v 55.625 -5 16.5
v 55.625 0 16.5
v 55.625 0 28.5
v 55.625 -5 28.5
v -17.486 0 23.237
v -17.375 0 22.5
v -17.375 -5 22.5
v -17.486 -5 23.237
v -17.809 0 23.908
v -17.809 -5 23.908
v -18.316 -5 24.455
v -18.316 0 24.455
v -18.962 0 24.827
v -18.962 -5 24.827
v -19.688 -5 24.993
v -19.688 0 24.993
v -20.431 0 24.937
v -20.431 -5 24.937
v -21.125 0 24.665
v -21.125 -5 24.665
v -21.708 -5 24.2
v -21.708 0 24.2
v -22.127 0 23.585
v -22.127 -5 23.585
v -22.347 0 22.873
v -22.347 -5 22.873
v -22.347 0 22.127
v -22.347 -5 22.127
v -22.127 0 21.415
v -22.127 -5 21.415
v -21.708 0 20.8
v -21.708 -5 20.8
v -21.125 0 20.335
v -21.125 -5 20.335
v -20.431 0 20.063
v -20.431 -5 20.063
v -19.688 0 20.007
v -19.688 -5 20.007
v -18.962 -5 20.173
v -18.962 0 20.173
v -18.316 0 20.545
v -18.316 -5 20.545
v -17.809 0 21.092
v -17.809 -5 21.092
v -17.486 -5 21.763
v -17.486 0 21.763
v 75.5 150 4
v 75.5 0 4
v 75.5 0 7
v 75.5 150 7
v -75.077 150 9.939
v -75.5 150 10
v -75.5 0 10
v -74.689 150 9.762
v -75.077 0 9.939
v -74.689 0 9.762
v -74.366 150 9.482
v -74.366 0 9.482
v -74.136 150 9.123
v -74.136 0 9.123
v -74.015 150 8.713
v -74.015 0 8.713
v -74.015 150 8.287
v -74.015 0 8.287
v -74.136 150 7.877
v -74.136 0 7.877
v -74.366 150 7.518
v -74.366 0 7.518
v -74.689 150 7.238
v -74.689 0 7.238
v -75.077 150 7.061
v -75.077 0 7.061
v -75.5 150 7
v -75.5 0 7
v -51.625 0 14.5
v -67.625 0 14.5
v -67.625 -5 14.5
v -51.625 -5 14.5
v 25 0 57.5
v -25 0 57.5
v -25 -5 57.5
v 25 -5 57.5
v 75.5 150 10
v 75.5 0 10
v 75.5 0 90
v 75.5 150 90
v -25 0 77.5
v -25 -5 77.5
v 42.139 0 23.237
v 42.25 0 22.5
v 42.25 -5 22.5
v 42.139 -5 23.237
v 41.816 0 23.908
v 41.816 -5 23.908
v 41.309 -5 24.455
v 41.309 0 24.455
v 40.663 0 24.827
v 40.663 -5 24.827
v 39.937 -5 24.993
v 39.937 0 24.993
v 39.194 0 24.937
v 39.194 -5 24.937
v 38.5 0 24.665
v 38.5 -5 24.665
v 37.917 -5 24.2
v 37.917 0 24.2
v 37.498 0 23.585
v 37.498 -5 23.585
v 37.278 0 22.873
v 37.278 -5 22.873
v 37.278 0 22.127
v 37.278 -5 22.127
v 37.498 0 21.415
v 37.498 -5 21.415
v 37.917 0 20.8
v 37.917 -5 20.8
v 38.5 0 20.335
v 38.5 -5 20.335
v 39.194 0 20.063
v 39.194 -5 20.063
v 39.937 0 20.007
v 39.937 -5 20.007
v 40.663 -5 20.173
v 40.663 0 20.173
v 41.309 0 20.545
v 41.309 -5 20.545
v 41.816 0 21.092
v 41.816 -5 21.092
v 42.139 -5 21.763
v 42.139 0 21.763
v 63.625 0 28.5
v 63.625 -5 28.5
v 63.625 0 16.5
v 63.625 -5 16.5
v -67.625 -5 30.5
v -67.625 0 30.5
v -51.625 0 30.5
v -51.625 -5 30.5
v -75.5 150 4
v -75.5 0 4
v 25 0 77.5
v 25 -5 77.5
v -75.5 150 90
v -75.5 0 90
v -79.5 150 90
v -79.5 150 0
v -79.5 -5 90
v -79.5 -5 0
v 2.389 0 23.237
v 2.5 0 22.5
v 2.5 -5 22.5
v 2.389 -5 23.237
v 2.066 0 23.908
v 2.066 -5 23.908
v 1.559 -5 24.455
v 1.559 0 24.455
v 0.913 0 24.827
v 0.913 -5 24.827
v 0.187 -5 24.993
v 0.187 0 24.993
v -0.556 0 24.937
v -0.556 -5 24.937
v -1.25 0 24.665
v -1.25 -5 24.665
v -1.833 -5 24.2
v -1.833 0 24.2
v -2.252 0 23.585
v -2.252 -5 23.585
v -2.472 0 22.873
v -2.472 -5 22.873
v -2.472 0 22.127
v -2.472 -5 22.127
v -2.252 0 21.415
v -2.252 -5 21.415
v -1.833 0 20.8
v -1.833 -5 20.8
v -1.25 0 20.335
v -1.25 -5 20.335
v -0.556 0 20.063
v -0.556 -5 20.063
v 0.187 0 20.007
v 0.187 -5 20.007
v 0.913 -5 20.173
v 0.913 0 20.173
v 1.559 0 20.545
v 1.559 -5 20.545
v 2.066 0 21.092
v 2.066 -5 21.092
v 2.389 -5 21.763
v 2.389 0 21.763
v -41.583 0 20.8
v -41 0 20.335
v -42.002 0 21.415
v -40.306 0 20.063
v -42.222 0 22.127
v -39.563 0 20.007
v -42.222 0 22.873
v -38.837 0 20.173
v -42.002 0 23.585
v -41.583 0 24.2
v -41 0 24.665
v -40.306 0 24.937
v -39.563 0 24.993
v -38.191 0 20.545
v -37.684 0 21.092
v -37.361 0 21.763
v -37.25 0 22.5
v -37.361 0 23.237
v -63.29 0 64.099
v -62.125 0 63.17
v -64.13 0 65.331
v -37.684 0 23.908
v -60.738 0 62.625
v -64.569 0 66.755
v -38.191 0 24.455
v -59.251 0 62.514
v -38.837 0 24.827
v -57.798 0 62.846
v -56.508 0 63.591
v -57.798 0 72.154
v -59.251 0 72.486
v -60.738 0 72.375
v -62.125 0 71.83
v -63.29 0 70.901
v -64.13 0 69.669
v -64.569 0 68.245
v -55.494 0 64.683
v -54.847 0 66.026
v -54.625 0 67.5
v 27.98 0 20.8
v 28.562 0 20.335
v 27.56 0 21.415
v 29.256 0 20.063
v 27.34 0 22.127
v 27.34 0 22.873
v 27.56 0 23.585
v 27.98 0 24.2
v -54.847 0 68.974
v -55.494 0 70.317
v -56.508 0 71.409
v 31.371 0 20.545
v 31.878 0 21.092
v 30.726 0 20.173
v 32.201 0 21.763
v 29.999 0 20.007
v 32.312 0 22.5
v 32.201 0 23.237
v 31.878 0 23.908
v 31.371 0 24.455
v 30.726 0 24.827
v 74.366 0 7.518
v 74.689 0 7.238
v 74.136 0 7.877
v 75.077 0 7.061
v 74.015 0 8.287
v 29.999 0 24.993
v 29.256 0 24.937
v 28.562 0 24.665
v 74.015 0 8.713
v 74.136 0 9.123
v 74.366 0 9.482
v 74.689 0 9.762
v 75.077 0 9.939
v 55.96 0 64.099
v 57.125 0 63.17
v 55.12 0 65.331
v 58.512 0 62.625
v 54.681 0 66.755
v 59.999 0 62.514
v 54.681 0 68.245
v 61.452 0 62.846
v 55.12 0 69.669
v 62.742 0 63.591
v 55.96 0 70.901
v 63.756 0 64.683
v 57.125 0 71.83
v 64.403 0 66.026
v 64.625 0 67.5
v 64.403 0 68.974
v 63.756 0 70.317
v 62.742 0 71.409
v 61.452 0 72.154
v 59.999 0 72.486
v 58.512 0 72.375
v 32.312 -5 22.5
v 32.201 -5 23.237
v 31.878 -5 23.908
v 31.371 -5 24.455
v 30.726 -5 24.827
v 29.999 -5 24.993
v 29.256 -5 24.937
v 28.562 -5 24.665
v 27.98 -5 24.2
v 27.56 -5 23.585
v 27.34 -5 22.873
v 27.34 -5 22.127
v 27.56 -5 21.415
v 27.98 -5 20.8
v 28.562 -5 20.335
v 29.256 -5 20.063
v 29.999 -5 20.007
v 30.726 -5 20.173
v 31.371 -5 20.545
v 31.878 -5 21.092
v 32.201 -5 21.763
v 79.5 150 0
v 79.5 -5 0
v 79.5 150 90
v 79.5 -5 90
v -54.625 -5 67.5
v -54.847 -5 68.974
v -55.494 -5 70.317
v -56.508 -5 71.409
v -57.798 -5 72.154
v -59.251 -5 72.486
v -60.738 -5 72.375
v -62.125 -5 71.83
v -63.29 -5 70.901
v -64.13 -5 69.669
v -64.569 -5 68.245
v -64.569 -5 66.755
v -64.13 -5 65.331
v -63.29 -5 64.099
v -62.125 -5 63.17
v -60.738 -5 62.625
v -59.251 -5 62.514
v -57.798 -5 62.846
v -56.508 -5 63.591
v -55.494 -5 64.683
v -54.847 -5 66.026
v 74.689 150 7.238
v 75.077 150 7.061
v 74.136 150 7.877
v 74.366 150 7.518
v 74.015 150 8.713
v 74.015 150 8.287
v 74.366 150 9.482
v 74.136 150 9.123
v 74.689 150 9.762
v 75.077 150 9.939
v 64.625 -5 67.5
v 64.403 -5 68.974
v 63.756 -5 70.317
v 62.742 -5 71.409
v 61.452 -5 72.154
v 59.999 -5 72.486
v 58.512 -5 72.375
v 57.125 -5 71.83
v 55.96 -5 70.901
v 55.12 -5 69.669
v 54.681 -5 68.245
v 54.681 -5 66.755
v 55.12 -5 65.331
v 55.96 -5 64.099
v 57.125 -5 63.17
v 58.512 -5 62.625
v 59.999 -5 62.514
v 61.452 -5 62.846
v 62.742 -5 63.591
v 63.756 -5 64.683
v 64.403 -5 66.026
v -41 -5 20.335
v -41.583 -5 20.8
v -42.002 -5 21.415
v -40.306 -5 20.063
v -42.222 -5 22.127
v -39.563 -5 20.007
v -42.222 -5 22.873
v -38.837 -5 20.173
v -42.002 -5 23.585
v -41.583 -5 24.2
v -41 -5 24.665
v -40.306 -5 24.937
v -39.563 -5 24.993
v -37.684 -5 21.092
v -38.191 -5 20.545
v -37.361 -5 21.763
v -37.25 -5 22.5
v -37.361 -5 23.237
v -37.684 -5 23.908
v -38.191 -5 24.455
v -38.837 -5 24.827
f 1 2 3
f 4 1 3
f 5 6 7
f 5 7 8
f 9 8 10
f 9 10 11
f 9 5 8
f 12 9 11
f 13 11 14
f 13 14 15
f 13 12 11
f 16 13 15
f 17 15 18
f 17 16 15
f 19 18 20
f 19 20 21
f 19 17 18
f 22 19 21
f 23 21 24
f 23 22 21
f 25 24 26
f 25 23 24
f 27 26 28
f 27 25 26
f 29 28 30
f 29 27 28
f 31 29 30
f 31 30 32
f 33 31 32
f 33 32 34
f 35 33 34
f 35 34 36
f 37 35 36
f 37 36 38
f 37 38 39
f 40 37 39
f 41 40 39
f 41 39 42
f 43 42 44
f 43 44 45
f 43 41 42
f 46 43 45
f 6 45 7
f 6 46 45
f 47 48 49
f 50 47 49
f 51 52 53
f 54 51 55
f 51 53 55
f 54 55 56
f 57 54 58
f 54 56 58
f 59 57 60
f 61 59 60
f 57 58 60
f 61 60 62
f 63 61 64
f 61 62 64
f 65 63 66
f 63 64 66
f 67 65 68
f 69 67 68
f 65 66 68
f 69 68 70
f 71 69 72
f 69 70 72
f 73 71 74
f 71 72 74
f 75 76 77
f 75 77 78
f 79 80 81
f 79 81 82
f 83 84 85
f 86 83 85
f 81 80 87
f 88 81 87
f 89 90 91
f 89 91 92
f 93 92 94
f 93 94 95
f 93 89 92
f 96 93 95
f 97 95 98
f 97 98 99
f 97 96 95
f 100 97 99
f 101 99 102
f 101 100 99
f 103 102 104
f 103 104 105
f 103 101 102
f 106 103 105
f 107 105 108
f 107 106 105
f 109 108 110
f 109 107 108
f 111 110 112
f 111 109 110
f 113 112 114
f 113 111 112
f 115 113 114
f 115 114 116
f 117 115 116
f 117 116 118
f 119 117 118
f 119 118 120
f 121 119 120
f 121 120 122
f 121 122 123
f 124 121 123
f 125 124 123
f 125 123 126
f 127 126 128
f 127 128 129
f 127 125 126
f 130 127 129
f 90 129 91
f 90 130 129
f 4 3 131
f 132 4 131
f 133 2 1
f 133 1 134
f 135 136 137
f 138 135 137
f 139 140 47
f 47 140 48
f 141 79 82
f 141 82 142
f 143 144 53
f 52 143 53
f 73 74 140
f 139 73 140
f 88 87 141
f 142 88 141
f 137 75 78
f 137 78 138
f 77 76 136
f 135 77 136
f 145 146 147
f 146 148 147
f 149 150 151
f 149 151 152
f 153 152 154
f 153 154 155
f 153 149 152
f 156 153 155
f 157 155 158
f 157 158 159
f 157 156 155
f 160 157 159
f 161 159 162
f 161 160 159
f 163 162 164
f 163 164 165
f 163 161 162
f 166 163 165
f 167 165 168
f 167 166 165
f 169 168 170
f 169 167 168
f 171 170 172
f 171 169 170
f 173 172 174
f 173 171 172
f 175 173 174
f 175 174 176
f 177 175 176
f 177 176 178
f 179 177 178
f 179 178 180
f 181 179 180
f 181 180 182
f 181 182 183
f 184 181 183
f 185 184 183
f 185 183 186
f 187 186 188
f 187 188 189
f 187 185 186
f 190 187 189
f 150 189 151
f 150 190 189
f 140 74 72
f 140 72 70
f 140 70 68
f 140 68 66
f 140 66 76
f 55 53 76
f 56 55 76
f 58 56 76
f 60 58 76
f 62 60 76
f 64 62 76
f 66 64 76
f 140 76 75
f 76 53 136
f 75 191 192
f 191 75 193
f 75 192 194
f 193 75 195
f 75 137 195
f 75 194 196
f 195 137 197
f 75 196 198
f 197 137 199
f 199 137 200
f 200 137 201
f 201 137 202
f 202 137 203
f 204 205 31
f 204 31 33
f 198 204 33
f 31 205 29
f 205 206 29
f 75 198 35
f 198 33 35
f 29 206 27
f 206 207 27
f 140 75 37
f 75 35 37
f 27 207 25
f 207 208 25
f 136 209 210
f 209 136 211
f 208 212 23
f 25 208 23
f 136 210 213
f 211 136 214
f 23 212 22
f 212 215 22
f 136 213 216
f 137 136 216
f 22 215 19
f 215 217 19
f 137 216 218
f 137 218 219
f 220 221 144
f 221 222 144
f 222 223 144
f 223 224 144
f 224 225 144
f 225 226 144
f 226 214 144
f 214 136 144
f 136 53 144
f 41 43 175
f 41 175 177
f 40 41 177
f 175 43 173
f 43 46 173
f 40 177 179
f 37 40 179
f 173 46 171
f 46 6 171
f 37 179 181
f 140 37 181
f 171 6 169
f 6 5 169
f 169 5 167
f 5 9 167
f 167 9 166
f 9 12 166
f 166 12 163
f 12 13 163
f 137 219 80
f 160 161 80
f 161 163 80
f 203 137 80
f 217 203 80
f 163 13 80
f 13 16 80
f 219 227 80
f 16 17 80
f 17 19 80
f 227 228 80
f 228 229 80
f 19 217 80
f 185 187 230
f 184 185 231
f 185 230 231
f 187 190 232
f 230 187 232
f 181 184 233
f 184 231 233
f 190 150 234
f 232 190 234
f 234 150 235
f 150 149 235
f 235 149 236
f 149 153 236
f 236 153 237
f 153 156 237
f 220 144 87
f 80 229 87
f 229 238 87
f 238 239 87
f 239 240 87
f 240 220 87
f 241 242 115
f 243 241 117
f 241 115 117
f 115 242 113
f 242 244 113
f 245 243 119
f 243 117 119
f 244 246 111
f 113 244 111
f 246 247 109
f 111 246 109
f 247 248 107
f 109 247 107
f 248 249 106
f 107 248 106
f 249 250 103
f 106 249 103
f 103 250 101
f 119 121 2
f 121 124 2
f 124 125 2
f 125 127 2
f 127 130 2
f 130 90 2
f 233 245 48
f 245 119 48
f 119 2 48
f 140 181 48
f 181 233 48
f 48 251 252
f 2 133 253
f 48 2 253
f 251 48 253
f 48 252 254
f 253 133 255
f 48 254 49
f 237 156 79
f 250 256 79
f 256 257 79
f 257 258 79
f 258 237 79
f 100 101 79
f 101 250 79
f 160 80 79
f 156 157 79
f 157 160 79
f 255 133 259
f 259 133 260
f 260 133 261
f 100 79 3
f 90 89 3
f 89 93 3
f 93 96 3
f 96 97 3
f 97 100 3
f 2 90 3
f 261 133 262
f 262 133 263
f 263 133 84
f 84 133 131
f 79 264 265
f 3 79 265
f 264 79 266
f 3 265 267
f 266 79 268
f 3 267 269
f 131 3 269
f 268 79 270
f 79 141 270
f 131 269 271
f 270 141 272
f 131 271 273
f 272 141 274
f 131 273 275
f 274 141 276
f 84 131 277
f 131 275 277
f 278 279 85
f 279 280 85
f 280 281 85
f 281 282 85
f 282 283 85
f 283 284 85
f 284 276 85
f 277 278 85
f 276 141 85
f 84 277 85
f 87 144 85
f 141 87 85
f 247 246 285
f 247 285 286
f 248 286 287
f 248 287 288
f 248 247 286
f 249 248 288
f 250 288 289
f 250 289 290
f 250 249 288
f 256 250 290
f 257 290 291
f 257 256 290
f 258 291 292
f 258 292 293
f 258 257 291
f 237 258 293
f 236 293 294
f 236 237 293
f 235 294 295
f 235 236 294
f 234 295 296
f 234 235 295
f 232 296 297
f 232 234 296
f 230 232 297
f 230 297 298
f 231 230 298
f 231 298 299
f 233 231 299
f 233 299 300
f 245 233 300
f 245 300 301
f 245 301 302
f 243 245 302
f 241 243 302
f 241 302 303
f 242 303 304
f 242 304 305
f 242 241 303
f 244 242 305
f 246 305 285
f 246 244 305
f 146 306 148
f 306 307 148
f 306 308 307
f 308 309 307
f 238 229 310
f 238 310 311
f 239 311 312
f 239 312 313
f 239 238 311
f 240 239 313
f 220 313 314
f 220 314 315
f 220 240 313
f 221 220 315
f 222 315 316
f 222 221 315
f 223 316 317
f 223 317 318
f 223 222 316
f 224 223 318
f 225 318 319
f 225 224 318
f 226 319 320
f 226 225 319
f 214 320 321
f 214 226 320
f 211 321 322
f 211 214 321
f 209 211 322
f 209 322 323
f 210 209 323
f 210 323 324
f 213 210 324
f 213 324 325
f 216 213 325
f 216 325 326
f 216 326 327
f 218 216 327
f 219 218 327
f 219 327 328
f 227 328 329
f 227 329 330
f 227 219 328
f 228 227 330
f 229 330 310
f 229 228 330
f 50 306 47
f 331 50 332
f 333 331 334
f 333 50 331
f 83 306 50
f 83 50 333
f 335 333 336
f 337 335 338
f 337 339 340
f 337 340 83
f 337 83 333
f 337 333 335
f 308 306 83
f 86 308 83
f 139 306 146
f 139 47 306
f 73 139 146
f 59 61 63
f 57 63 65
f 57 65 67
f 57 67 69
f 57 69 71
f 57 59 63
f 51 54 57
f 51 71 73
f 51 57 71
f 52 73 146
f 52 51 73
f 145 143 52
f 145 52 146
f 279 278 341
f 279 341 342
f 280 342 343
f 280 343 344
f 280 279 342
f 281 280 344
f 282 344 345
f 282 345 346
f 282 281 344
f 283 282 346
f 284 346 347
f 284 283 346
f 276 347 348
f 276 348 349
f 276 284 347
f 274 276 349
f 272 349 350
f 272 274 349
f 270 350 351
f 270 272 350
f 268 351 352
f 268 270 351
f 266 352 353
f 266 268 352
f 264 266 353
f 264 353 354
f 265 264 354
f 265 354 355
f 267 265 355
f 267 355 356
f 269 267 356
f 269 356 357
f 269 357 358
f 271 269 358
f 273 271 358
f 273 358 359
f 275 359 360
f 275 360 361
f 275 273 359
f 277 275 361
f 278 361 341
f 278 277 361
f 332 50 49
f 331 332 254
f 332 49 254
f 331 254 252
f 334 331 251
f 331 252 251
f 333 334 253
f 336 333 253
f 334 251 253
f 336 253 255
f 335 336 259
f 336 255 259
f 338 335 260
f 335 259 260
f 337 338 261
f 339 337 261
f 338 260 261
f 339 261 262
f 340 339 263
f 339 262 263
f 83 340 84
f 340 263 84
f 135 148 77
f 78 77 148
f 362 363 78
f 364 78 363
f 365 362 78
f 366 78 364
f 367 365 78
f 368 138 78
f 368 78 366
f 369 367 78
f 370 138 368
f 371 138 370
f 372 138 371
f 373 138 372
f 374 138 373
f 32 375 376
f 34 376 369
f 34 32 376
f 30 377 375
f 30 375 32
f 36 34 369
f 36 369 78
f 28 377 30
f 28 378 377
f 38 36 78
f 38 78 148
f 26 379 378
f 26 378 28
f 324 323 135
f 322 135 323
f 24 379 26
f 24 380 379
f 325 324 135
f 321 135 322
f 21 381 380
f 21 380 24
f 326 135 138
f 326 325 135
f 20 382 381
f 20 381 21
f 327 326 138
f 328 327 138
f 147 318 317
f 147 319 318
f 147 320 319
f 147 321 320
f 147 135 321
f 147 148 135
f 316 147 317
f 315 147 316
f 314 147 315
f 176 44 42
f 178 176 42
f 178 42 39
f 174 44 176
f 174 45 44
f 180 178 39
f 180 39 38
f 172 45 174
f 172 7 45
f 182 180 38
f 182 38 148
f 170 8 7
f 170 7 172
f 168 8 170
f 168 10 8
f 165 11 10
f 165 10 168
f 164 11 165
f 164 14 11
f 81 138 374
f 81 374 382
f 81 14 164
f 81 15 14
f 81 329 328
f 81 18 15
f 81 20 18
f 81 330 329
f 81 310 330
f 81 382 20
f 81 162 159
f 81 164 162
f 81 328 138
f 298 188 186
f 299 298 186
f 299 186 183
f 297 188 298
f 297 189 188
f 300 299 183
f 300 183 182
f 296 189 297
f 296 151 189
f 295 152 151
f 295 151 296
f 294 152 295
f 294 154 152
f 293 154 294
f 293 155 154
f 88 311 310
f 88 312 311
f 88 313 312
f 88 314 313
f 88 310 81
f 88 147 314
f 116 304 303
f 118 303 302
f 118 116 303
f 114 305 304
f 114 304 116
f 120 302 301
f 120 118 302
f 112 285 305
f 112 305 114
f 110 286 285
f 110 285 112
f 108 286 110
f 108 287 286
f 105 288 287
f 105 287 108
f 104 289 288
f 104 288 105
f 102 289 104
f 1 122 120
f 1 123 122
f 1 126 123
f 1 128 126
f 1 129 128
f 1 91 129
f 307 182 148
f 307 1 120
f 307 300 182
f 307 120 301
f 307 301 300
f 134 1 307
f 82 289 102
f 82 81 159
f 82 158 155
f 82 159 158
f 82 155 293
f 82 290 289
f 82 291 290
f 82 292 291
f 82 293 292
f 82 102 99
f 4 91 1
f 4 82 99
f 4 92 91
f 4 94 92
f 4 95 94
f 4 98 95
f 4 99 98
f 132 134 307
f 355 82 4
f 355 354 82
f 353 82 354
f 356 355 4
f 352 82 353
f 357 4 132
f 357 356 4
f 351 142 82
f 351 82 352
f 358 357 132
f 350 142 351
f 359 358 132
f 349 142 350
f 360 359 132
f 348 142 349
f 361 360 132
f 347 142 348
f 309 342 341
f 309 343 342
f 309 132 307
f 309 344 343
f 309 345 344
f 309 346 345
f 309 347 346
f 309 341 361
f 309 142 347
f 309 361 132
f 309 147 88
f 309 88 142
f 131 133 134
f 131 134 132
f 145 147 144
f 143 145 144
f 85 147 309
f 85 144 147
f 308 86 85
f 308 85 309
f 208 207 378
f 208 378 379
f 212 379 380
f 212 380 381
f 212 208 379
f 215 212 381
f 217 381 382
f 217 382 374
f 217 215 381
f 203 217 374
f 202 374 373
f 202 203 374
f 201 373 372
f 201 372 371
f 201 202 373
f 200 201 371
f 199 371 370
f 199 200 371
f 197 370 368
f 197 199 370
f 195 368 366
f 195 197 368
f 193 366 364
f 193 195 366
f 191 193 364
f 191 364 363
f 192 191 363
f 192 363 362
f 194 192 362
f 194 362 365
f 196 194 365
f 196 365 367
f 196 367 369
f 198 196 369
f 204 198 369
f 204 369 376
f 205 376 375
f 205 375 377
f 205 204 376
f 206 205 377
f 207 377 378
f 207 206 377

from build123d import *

# Parameters (mm, degrees)
F0_W     = 159
F0_H     = 90
F0_W_2   = 16
F0_H_2   = 16
F0_R     = 2.5
F0_W_3   = 8
F0_H_3   = 12
F0_R_2   = 5
F0_W_4   = 50
F0_H_4   = 20
F1_DEPTH = 5
F3_DEPTH = 150


with BuildPart() as f1:
    # F0 (on Front) → F1 (new body)
    with BuildSketch(Plane.XZ):
        with Locations((0, 45)):
            Rectangle(F0_W, F0_H)
        with Locations((-59.625, 22.5)):
            Rectangle(F0_W_2, F0_H_2, mode=Mode.SUBTRACT)
        with Locations((-39.75, 22.5)):
            Circle(F0_R, mode=Mode.SUBTRACT)
        with Locations((-19.875, 22.5)):
            Circle(F0_R, mode=Mode.SUBTRACT)
        with Locations((0, 22.5)):
            Circle(F0_R, mode=Mode.SUBTRACT)
        with Locations((29.8125, 22.5)):
            Circle(F0_R, mode=Mode.SUBTRACT)
        with Locations((39.75, 22.5)):
            Circle(F0_R, mode=Mode.SUBTRACT)
        with Locations((59.625, 22.5)):
            Rectangle(F0_W_3, F0_H_3, mode=Mode.SUBTRACT)
        with Locations((-59.625, 67.5)):
            Circle(F0_R_2, mode=Mode.SUBTRACT)
        with Locations((0, 67.5)):
            Rectangle(F0_W_4, F0_H_4, mode=Mode.SUBTRACT)
        with Locations((59.625, 67.5)):
            Circle(F0_R_2, mode=Mode.SUBTRACT)
    extrude(amount=F1_DEPTH)

    # F2 (on face) → F3 (join)
    with BuildSketch(Plane(origin=(0, 0, 0), x_dir=(-1, 0, 0), z_dir=(0, 1, 0))):
        with BuildLine():
            Line((75.5, 4), (-75.5, 4))
            Line((-75.5, 4), (-75.5, 7))
            ThreePointArc((-75.5, 7), (-74, 8.5), (-75.5, 10))
            Line((-75.5, 10), (-75.5, 90))
            Line((-75.5, 90), (-79.5, 90))
            Line((-79.5, 90), (-79.5, 0))
            Line((-79.5, 0), (79.5, 0))
            Line((79.5, 0), (79.5, 90))
            Line((79.5, 90), (75.5, 90))
            Line((75.5, 90), (75.5, 10))
            ThreePointArc((75.5, 10), (74, 8.5), (75.5, 7))
            Line((75.5, 7), (75.5, 4))
        make_face()
    extrude(amount=F3_DEPTH)


solid = f1.part
